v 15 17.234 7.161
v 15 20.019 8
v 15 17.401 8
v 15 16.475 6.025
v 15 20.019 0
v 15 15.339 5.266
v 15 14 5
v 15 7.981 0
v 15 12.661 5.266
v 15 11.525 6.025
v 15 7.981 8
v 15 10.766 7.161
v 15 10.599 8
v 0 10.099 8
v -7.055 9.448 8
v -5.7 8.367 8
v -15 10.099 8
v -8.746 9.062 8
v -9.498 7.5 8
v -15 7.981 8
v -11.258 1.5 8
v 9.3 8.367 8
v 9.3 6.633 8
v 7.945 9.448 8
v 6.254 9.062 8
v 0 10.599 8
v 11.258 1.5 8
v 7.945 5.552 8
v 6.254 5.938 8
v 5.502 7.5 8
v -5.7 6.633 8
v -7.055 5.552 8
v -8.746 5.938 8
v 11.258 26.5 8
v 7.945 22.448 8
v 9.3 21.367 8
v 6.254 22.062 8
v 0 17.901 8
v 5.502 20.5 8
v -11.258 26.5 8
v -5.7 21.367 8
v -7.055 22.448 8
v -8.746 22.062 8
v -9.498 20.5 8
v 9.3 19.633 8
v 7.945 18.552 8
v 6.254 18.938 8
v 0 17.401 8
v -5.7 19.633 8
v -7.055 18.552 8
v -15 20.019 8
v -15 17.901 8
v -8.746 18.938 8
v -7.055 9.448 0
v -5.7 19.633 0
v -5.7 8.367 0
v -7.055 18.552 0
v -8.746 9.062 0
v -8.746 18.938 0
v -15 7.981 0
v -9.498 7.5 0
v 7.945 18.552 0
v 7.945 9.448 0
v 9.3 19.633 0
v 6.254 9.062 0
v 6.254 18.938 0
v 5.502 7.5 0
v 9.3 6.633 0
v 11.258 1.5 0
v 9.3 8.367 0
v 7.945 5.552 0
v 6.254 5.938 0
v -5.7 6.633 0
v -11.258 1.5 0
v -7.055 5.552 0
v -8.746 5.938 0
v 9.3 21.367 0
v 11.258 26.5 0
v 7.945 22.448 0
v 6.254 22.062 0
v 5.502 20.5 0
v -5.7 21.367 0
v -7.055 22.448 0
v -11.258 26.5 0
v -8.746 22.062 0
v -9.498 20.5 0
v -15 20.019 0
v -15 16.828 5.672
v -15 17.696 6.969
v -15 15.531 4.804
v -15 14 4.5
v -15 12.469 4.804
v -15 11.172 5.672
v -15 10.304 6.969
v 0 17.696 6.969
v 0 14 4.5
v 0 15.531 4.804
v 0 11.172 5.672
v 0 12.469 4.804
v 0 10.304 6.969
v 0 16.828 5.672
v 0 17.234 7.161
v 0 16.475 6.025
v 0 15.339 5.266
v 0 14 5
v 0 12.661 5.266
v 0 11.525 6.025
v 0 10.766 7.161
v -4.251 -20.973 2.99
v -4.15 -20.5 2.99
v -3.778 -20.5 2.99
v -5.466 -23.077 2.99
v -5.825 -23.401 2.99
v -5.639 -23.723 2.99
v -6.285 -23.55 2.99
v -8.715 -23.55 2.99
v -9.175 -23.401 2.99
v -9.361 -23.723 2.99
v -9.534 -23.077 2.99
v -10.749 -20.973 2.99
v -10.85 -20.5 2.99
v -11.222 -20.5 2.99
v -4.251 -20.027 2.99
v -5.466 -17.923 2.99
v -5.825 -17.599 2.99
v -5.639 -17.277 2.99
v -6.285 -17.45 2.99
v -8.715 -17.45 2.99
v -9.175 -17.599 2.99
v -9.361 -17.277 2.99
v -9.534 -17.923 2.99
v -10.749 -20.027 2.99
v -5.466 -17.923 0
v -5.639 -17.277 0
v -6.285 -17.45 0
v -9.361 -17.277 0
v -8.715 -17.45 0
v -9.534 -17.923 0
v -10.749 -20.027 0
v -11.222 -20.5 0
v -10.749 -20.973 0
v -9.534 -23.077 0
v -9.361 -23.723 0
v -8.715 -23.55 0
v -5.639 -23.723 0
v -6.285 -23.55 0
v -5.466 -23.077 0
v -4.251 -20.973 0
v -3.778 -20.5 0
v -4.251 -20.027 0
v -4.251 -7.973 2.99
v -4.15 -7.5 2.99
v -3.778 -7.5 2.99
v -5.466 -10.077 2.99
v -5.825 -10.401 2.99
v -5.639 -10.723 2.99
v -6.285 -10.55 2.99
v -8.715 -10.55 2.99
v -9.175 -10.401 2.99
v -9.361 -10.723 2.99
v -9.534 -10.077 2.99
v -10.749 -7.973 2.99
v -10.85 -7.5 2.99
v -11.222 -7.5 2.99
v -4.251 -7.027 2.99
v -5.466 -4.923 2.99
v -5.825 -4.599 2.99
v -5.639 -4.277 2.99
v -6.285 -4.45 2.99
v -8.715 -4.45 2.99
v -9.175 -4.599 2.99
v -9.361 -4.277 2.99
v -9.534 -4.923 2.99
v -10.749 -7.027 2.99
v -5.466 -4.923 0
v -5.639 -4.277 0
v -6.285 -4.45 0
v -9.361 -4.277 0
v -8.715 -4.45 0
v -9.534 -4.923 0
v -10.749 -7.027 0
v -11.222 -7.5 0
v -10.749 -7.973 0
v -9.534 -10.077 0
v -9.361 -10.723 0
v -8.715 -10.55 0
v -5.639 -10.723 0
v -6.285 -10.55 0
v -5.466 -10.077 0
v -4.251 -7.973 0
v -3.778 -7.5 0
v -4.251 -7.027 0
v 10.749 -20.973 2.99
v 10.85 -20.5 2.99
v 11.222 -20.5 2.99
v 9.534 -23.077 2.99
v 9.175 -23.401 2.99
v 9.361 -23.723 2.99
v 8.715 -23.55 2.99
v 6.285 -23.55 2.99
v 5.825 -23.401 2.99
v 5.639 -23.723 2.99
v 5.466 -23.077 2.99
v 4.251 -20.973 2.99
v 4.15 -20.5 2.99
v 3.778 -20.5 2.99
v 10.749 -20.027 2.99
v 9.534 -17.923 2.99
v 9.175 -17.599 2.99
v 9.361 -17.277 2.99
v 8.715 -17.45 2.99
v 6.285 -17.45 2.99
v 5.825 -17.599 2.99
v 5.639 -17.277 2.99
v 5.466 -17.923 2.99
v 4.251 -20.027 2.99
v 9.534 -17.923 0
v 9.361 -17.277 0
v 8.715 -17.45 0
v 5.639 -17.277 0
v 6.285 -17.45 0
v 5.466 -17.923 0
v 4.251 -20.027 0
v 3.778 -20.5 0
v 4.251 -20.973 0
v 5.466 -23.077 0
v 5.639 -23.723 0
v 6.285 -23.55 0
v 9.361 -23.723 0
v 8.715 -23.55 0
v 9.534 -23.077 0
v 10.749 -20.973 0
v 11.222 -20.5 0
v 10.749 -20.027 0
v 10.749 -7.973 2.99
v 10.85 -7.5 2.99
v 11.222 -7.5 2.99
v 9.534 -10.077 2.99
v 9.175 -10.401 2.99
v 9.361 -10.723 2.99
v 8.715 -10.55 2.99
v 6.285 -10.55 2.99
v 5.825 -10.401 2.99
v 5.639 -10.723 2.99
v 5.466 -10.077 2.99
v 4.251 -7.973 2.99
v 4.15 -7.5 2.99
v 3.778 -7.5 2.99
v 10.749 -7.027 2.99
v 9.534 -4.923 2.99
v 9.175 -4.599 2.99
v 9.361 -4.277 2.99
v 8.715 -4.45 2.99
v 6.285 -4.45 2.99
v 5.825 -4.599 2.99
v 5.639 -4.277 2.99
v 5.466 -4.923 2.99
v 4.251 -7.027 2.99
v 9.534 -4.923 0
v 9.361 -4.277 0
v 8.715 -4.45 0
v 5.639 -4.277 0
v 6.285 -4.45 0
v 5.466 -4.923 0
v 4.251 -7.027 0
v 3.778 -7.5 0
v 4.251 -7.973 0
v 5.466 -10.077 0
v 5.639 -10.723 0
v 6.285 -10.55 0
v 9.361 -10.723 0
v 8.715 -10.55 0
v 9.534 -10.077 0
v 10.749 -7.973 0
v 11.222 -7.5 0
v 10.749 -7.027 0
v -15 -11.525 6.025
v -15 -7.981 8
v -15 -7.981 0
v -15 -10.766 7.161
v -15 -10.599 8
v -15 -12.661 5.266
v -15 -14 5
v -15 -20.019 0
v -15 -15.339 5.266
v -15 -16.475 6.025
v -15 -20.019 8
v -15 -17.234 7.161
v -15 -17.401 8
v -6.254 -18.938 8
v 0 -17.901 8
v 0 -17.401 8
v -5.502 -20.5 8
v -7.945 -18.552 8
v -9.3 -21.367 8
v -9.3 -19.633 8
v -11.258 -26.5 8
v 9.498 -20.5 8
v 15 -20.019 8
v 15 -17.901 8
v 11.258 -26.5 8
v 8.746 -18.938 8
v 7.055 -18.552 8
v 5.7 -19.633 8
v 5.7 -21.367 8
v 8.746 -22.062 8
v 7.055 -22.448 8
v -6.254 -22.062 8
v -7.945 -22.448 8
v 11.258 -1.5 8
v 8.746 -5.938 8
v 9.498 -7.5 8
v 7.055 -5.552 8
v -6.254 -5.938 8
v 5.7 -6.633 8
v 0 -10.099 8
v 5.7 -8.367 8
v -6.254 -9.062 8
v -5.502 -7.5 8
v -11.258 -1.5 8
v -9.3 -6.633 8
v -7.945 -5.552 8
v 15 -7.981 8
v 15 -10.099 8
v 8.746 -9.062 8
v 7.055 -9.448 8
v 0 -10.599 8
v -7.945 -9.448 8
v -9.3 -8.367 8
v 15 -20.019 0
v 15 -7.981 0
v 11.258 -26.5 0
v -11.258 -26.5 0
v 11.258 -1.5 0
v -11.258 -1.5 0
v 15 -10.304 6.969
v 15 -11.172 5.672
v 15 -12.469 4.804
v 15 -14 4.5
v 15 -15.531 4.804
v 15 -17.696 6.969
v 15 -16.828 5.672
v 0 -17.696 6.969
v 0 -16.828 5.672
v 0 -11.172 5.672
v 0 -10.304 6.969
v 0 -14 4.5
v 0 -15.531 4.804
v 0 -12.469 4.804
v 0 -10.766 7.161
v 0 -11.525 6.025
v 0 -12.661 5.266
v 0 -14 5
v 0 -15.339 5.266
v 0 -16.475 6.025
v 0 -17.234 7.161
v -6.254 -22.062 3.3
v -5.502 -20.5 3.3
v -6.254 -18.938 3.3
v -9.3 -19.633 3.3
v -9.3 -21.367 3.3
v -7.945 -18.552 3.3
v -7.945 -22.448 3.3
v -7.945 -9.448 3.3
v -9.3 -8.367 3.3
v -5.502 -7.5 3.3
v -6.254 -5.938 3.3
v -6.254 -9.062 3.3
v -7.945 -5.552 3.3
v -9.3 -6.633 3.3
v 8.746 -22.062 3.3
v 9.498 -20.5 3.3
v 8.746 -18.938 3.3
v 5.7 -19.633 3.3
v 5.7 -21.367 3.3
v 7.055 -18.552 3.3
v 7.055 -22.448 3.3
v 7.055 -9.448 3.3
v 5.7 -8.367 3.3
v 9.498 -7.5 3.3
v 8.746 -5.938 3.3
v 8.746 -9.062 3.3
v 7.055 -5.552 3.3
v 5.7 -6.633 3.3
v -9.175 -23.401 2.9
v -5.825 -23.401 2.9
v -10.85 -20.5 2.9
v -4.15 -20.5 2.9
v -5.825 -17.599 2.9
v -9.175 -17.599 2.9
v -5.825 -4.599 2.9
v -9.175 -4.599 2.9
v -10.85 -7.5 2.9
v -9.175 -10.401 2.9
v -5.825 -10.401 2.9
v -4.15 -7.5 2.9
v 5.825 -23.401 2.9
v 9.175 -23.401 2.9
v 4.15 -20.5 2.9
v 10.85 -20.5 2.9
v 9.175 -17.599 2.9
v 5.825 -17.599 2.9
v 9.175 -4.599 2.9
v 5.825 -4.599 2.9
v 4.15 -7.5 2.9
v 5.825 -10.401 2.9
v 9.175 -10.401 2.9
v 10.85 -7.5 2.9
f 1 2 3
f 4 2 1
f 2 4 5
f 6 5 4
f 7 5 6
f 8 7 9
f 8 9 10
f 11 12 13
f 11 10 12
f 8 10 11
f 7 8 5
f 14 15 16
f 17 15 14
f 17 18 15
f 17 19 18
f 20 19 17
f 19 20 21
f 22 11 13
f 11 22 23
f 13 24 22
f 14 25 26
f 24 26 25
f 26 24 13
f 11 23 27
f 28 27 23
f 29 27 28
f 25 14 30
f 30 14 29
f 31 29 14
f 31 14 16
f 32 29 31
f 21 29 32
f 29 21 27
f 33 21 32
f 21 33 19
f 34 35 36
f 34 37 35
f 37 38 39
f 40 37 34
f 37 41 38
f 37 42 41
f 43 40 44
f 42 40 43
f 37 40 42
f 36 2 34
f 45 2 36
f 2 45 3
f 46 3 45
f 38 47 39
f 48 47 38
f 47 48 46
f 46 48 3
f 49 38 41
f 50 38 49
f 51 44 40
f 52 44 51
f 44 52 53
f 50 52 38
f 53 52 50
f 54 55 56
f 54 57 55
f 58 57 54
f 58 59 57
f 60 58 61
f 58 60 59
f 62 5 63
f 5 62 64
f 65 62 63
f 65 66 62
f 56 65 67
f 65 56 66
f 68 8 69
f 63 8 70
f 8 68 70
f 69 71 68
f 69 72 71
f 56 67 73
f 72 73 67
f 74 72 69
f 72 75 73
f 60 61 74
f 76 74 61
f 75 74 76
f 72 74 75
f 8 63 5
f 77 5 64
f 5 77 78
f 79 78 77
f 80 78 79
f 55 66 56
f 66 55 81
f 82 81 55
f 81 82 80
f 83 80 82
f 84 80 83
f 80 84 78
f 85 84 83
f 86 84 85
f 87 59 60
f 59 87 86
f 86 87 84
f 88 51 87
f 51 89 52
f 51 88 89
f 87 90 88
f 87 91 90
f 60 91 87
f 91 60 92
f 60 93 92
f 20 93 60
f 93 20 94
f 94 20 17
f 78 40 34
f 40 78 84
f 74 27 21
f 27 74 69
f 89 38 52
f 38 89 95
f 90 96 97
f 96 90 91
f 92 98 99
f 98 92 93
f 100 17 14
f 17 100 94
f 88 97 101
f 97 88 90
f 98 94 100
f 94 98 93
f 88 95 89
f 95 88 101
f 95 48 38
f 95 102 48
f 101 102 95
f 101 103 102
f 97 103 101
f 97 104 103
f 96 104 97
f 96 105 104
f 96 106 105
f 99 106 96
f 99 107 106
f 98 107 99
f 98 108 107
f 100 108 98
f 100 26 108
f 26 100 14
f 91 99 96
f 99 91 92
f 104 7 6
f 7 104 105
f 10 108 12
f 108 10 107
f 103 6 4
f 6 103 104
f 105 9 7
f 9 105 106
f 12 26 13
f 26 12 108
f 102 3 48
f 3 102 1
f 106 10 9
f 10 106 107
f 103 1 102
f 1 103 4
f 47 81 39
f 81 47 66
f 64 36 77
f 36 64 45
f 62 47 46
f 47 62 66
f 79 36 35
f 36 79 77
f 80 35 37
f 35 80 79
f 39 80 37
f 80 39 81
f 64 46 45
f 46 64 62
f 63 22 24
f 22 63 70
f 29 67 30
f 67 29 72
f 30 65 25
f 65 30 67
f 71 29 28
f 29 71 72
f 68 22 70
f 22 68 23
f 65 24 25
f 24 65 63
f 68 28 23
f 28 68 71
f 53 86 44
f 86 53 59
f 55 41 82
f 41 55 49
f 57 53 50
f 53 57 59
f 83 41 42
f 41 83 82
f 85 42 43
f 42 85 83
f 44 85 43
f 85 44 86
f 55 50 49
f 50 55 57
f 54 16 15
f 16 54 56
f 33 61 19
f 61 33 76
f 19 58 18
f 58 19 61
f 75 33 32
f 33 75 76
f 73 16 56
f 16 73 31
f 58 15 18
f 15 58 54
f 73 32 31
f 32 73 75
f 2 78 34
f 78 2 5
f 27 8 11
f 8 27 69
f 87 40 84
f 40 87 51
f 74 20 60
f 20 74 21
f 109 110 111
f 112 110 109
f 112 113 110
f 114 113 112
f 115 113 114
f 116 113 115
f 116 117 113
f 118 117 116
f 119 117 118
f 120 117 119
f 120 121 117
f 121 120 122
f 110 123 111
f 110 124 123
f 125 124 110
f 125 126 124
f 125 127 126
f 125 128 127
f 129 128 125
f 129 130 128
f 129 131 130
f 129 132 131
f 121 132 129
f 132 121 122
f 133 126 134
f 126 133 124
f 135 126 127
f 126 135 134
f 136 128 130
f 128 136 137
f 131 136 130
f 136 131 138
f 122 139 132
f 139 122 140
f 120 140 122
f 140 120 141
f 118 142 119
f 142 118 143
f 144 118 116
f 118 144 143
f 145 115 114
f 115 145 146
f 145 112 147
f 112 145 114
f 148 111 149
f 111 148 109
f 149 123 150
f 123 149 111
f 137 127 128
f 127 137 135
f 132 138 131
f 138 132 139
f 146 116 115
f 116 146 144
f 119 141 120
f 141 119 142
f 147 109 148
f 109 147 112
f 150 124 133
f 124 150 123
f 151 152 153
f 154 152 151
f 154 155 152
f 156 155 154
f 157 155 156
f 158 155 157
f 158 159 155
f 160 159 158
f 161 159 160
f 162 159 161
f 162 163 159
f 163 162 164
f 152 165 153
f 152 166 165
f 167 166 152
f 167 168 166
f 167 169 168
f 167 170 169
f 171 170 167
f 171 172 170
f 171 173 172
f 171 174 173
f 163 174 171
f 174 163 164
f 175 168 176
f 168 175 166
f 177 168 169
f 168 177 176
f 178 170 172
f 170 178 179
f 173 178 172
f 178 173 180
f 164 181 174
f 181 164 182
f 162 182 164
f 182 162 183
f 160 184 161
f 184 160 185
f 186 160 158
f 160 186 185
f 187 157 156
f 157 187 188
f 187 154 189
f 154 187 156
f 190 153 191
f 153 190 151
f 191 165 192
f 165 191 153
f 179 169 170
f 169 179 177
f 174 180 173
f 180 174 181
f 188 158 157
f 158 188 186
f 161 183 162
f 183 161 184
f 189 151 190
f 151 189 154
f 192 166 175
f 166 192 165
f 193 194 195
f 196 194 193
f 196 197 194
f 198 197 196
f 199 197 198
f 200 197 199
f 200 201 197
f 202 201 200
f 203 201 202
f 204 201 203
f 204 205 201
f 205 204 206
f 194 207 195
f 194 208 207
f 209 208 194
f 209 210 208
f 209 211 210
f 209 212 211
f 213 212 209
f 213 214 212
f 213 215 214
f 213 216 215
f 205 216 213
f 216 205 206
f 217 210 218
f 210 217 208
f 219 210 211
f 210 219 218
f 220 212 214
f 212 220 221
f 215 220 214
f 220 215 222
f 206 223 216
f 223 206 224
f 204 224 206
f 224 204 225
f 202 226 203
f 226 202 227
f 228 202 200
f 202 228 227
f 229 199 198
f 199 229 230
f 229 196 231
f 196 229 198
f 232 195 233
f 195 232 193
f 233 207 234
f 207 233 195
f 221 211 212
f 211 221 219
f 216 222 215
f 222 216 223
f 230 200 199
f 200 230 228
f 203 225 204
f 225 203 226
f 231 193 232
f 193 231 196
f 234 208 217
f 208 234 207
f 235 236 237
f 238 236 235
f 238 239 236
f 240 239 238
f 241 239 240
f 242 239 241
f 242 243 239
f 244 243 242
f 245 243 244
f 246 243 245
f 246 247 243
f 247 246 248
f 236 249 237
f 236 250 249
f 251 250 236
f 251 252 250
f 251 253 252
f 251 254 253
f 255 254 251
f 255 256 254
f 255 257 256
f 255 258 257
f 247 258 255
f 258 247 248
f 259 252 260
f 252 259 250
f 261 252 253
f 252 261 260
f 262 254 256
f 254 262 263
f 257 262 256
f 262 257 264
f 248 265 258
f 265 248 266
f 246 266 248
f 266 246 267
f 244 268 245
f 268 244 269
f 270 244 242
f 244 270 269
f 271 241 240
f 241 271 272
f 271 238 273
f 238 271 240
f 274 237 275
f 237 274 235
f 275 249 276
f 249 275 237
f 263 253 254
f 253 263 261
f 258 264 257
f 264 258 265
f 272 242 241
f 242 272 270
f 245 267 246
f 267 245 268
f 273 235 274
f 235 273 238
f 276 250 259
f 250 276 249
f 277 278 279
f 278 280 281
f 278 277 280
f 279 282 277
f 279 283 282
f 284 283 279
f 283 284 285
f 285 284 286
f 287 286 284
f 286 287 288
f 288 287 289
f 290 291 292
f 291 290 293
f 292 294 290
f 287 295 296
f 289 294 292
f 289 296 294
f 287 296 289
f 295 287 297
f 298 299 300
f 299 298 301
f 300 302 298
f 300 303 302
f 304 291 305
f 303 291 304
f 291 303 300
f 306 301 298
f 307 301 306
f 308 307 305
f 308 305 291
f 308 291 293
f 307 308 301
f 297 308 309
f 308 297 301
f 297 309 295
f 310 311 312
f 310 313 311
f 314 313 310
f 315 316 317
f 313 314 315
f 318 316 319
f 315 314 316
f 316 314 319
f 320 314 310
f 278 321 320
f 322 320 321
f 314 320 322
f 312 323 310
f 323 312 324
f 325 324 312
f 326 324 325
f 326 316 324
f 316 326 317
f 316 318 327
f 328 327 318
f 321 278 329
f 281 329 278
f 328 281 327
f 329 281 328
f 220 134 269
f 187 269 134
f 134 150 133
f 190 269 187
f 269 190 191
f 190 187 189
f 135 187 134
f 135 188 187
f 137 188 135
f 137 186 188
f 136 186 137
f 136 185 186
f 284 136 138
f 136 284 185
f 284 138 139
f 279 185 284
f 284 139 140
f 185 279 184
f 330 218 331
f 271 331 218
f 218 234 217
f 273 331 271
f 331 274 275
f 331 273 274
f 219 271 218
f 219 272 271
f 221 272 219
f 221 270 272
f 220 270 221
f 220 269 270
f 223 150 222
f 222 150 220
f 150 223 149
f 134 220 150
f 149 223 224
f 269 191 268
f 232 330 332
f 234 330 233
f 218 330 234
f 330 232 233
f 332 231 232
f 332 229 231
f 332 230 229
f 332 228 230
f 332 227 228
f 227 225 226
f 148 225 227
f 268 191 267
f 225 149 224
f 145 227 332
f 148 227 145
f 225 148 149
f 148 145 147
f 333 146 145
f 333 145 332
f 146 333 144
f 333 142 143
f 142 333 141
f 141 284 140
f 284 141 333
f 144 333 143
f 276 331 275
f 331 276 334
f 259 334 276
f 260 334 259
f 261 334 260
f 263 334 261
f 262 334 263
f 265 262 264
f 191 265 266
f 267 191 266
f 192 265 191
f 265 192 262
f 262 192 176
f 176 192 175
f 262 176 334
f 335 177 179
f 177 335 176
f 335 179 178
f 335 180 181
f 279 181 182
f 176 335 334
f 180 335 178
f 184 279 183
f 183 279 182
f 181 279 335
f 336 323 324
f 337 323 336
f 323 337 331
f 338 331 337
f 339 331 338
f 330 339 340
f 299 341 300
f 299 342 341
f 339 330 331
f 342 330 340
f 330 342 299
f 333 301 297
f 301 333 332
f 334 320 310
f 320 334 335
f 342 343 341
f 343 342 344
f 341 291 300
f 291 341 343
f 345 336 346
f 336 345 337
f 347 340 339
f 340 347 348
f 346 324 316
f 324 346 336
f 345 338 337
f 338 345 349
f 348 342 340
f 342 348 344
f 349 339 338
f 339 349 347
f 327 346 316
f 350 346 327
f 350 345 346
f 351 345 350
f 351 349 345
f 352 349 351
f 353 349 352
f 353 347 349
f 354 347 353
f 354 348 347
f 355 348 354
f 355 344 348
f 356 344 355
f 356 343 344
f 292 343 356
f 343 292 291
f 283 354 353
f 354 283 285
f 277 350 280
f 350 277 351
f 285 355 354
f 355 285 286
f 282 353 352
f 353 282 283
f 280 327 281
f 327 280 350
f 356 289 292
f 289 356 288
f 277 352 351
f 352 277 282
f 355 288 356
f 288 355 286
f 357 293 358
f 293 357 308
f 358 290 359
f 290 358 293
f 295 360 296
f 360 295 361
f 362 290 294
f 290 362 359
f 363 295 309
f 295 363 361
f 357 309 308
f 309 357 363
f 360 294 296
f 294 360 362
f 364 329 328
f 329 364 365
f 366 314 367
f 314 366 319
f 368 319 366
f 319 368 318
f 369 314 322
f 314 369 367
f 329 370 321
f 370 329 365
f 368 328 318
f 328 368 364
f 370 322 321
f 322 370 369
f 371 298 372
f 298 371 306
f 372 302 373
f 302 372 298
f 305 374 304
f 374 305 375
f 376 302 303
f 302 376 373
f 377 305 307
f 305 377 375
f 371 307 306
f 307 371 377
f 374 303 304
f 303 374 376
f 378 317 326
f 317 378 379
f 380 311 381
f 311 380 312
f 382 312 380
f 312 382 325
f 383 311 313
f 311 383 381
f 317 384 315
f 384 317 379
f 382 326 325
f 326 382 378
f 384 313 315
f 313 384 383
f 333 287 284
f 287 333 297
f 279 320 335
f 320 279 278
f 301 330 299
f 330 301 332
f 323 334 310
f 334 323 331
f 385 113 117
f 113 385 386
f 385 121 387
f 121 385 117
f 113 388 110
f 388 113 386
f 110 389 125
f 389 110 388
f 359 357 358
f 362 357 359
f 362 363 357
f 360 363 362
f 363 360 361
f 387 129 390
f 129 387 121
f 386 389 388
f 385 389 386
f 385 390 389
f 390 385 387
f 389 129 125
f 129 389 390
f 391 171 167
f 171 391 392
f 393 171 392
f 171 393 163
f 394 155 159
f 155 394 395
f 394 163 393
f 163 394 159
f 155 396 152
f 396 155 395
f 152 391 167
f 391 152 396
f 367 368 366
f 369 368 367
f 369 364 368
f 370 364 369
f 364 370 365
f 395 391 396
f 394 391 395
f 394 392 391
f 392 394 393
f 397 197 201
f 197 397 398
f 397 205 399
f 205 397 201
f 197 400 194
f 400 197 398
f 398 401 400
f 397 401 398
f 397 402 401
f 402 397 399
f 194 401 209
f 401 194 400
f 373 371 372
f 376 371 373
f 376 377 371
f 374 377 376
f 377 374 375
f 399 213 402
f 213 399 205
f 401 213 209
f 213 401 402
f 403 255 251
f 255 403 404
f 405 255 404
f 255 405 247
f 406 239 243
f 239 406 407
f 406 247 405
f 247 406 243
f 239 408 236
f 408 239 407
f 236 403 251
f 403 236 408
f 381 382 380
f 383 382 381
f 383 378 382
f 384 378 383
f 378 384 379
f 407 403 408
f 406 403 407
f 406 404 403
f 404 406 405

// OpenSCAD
// file: functions.scad
// PRUSA Mendel  
// Functions used in many files
// GNU GPL v2
// Josef Průša
// josefprusa@me.com
// prusadjs.cz
// http://www.reprap.org/wiki/Prusa_Mendel
// http://github.com/prusajr/PrusaMendel

module nut(d,h,horizontal=true){
cornerdiameter =  (d / 2) / cos (180 / 6);
cylinder(h = h, r = cornerdiameter, $fn = 6);
if(horizontal){
for(i = [1:6]){
	rotate([0,0,60*i]) translate([-cornerdiameter-0.2,0,0]) rotate([0,0,-45]) cube(size = [2,2,h]);
}}
}

// By nophead
module polyhole(d,h) {
    n = max(round(2 * d),3);
    rotate([0,0,180])
        cylinder(h = h, r = (d / 2) / cos (180 / n), $fn = n);
}




module roundcorner(diameter){
	difference(){
		cube(size = [diameter,diameter,99], center = false);
		translate(v = [diameter, diameter, 0]) cylinder(h = 100, r=diameter, center=true);
	}
}
// file: metric.scad
// PRUSA Mendel  
// Default metric sizes
// GNU GPL v2
// Josef Průša
// josefprusa@me.com
// prusadjs.cz
// http://www.reprap.org/wiki/Prusa_Mendel
// http://github.com/prusajr/PrusaMendel

// DONT CHANGE THIS FILE! ALTER VALUES IN CONFIGURATION.SCAD INSTEAD

// RODS

threaded_rod_diameter = 8.2;
threaded_rod_diameter_horizontal = 8.2;
smooth_bar_diameter = 8;
smooth_bar_diameter_horizontal = 8.5;

// Nuts and bolts

m8_diameter = 9;
m8_nut_diameter = 16.4;

m4_diameter = 4.5;
m4_nut_diameter = 9;

m3_diameter = 3.6;
m3_nut_diameter = 6.1;

// Bushing holder

bushing_core_diameter = smooth_bar_diameter;
bushing_material_thickness = 1;

// Motors

motor_shaft = 5.5;
// file: configuration.scad
// PRUSA Mendel  
// Configuration file
// GNU GPL v2
// Josef Průša
// josefprusa@me.com
// prusadjs.cz
// http://www.reprap.org/wiki/Prusa_Mendel
// http://github.com/prusajr/PrusaMendel

// PLEASE SELECT ONE OF THE CONFIGURATIONS BELOW
// BY UN-COMMENTING IT

// Uncomment for metric settings
// METRIC METRIC METRIC METRIC METRIC METRIC METRIC METRIC 

include <metric.scad>;

// Uncomment for imperial settings
// IMPERIAL IMPERIAL IMPERIAL IMPERIAL IMPERIAL IMPERIAL IMPERIAL 

//include <sae.scad>;

// CUSTOM CUSTOM CUSTOM CUSTOM CUSTOM CUSTOM CUSTOM CUSTOM CUSTOM

thin_wall = 3;

// LM8UU
linear = false;


// CHANGE ONLY THE STUFF YOU KNOW
// IT WILL REPLACE DEFAULT SETTING

// RODS

// threaded_rod_diameter = 0;
// threaded_rod_diameter_horizontal = 0;
// smooth_bar_díameter = 0;
// smooth_bar_díameter_horizontal = 0;

// Nuts and bolts

// m8_diameter = 0;
// m8_nut_diameter = 0;

// m4_diameter = 0;
// m4_nut_diameter = 0;

// m3_diameter = 0;
// m3_nut_diameter = 0;

// Bushing holder

// bushing_core_diameter = smooth_bar_díameter;
// bushing_material_thickness = 0;


///counted stuff
m3_nut_diameter_bigger = ((m3_nut_diameter  / 2) / cos (180 / 6))*2;

// functions 
include <functions.scad>
// main file
// PRUSA Mendel  
// Coupling from nophead
// GNU GPL v2
// Josef Průša
// josefprusa@me.com
// prusadjs.cz
// http://www.reprap.org/wiki/Prusa_Mendel
// http://github.com/prusajr/PrusaMendel

include <configuration.scad>

/**
 * @id coupling
 * @name Coupling
 * @category Printed
 * @using 4 m3x20
 * @using 4 m3washer
 * @using 4 m3nut
 * @step Place M3 nuts in all nut traps.
 * @step Insert screws with washers on them and tighet it just a bit.
 */

/**
 * 20mm long piece of PVC tube. 5mm inside diameter, 8mm outside diameter.
 * @id coupling-tube
 * @name Coupling tube
 * @category Nuts&bolts
 */

holeX = 7.5;
holeY = 6.5;

holeR = 3.4;
nutR = 3.25;
nutH = 3;
corner_cut = 26;

studding_dia = 8.0;
shaft_dia = 7.0;

module coupling(c){
    union(){
        difference(){
            cube(size = [30,25,8], center = true);

            if(c==1){
                //slot
            	*cube(size = [2,40,30], center = true);
                
                //nut holes
            	translate([ holeX,  holeY, nutH/2 - 4.01-3/2]) nut(m3_nut_diameter,3);
            	translate([ holeX, -holeY, nutH/2 - 4.01-3/2]) nut(m3_nut_diameter,3);
            	translate([-holeX,  holeY, nutH/2 - 4.01-3/2]) nut(m3_nut_diameter,3);
            	translate([-holeX, -holeY, nutH/2 - 4.01-3/2]) nut(m3_nut_diameter,3);
            }

            //shaft groves
            translate([ -16, 0, 4.5]) rotate([0,90,0]) cylinder(h = 16, r=studding_dia / 2, $fn=16);
            translate([-0.5, 0, 4.5]) rotate([0,90,0]) cylinder(h = 16, r=shaft_dia / 2,    $fn=16);

            //screw holes
            translate([ holeX,  holeY, -10]) polyhole(m3_diameter,20);
            translate([ holeX, -holeY, -10]) polyhole(m3_diameter,20);
            translate([-holeX,  holeY, -10]) polyhole(m3_diameter,20);
            translate([-holeX, -holeY, -10]) polyhole(m3_diameter,20);

            //corners
            rotate([0,0,30])   translate([corner_cut, 0, 0]) cube(size = [20,40,20], center = true);
            rotate([0,0,-30])  translate([corner_cut, 0, 0]) cube(size = [20,40,20], center = true);
            rotate([0,0,150])  translate([corner_cut, 0, 0]) cube(size = [20,40,20], center = true);
            rotate([0,0,-150]) translate([corner_cut, 0, 0]) cube(size = [20,40,20], center = true);
        }
        if(c==1){
            // bridge
        	translate([ holeX,  holeY, nutH-3.9]) cylinder(h = 0.4, r=nutR+0.1, $fn=6, center=true);
        	translate([ holeX, -holeY, nutH-3.9]) cylinder(h = 0.4, r=nutR+0.1, $fn=6, center=true);
        	translate([-holeX,  holeY, nutH-3.9]) cylinder(h = 0.4, r=nutR+0.1, $fn=6, center=true);
        	translate([-holeX, -holeY, nutH-3.9]) cylinder(h = 0.4, r=nutR+0.1, $fn=6, center=true);
        }
    }
}

translate([0, 14, 4]) coupling(c=0);
translate([0, -14, 4]) rotate([0,0,180]) coupling(c=1);
